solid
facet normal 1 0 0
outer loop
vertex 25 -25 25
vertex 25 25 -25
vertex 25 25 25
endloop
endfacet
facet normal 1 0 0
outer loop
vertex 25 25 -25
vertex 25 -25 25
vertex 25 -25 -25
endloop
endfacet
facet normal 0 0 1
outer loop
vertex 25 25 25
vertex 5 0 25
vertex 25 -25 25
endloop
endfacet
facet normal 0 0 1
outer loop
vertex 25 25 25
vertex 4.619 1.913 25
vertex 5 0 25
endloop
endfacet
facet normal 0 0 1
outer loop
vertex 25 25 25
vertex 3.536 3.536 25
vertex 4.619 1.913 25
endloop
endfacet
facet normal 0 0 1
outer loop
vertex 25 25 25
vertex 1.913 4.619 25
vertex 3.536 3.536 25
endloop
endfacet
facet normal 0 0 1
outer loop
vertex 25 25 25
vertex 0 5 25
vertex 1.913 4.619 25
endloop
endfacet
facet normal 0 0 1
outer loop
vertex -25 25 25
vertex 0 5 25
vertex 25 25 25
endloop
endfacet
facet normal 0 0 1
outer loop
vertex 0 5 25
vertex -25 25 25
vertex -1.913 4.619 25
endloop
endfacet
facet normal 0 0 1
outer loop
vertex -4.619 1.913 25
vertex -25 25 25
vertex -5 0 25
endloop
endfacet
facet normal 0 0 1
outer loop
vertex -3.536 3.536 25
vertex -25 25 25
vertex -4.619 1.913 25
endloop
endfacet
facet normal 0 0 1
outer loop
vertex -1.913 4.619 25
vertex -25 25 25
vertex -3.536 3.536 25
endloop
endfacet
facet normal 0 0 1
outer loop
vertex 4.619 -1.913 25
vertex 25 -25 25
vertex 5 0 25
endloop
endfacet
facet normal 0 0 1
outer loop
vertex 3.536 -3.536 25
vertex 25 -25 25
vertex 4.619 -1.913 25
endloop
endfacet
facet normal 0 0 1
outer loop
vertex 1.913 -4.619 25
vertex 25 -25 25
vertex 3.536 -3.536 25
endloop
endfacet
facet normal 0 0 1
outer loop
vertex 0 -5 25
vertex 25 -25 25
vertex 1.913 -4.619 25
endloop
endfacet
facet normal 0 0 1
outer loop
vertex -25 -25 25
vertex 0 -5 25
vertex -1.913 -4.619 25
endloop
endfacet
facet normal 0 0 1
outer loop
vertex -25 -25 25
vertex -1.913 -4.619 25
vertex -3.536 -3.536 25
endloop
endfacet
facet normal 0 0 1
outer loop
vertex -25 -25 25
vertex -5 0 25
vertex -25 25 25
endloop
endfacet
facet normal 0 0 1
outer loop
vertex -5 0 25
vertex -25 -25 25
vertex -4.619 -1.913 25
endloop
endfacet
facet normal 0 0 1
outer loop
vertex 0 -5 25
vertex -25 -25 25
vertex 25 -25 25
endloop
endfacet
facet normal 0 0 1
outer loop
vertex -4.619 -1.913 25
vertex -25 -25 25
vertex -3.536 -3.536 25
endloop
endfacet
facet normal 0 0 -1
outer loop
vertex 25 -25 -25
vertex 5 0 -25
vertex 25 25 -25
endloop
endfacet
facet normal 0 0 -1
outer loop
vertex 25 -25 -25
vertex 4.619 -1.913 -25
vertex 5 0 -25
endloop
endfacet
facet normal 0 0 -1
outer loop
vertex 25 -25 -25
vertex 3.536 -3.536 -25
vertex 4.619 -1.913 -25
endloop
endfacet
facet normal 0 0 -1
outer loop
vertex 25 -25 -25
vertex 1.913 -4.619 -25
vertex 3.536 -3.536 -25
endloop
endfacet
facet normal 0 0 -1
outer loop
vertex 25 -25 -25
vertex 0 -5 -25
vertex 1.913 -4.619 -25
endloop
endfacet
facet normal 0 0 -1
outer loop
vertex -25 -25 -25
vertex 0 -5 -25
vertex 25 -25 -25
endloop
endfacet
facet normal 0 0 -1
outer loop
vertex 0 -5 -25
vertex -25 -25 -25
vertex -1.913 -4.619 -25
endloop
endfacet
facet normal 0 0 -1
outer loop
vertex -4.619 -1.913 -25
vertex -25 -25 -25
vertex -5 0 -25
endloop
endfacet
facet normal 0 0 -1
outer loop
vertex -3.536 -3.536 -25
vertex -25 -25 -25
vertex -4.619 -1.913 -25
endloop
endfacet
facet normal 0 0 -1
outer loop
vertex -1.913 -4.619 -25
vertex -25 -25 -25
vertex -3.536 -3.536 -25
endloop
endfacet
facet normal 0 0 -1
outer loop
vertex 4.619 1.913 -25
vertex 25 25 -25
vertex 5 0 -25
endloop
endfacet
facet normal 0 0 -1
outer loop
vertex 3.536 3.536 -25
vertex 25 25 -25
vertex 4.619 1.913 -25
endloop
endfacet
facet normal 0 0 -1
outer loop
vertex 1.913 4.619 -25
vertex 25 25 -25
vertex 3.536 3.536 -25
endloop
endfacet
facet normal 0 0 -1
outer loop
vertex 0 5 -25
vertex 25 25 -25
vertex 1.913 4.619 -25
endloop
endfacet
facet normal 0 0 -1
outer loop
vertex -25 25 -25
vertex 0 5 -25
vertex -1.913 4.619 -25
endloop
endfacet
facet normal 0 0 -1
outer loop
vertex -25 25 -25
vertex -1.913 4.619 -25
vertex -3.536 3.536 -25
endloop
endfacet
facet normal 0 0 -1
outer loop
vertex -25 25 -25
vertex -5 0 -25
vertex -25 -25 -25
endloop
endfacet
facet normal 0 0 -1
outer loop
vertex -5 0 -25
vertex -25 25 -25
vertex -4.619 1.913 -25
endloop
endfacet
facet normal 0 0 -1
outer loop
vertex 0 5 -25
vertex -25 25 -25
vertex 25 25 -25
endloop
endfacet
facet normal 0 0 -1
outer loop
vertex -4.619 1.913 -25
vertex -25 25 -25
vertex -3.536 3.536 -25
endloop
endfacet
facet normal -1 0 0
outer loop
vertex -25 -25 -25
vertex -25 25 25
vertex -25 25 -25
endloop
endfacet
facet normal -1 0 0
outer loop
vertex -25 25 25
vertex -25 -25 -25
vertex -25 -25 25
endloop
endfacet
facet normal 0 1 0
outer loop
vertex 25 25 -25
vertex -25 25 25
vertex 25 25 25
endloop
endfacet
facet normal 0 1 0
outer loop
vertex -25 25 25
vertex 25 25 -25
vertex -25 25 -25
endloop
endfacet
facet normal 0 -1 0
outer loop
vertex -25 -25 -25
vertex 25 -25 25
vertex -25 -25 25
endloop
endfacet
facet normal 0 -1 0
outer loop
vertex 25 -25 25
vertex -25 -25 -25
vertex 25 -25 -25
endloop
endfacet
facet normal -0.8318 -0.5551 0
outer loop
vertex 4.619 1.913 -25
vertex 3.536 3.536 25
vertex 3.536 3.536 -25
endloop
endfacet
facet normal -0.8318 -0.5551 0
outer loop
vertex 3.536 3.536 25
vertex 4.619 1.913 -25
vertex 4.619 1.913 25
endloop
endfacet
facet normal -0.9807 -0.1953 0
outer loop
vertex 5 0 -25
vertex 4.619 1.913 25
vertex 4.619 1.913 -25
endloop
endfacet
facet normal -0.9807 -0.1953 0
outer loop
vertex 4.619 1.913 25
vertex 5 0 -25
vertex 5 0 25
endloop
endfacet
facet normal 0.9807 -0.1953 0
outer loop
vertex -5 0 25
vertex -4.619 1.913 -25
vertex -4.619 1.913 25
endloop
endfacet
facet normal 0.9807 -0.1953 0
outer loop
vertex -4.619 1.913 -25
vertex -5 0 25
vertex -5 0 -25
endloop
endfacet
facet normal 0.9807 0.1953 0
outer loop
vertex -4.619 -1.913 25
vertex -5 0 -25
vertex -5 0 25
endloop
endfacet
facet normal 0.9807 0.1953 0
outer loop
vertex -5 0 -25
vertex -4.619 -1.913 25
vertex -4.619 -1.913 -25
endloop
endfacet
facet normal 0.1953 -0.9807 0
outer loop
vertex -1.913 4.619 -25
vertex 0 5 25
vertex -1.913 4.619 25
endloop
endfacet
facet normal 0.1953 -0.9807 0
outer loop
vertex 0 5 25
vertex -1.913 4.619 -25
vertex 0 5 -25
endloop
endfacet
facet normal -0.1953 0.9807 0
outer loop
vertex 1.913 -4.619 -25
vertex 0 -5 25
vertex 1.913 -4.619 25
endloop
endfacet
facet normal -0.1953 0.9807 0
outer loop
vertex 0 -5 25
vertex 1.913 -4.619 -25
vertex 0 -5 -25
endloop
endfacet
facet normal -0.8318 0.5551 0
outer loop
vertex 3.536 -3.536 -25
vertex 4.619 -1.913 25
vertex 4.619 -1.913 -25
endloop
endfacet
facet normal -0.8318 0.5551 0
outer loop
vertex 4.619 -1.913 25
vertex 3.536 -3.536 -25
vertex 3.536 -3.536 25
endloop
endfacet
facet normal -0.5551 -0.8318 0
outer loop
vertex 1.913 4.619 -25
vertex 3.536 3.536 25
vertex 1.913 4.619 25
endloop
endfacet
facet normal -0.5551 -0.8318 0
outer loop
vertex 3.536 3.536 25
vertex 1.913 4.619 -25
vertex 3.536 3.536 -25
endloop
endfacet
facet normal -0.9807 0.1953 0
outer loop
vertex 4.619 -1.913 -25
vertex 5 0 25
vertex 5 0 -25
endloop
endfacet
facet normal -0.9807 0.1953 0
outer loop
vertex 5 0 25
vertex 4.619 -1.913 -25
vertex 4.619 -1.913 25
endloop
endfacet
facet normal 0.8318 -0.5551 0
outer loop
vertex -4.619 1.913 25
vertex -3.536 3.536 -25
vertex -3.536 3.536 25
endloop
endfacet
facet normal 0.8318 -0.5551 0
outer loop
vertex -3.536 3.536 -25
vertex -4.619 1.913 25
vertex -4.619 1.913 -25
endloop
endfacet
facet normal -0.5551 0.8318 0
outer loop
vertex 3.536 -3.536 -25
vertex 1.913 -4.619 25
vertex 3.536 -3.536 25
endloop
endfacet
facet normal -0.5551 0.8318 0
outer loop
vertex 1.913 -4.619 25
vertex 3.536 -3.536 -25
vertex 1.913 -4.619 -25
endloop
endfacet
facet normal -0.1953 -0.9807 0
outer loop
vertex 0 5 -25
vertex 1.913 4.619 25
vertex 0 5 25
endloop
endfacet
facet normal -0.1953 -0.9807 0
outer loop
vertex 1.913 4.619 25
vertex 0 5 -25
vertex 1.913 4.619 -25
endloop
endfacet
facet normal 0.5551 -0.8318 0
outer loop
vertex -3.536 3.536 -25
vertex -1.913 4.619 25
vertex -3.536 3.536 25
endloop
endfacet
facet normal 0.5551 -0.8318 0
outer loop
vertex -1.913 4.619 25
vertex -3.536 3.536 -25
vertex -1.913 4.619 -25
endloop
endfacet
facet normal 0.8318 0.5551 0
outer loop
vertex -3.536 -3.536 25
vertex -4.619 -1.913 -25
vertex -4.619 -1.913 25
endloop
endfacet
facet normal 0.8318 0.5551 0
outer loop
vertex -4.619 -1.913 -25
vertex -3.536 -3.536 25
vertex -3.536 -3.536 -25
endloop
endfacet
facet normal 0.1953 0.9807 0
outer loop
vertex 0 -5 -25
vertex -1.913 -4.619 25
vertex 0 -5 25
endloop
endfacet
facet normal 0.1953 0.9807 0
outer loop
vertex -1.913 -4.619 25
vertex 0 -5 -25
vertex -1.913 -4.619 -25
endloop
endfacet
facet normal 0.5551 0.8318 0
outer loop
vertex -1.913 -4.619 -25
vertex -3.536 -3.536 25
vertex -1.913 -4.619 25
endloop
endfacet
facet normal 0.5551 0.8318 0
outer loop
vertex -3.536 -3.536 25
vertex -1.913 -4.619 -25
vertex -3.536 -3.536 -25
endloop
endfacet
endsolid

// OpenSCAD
cube_size = 50;
hole_diameter = 10;
hole_radius = hole_diameter / 2;
hole_offset = cube_size / 2;

difference() {
    cube([cube_size, cube_size, cube_size], center = true);
    rotate([0, 0, 0])
    translate([0, 0, hole_offset])
    cylinder(h = cube_size + 2, r = hole_radius, center = true);
    rotate([180, 0, 0])
    translate([0, 0, hole_offset])
    cylinder(h = cube_size + 2, r = hole_radius, center = true);
}
